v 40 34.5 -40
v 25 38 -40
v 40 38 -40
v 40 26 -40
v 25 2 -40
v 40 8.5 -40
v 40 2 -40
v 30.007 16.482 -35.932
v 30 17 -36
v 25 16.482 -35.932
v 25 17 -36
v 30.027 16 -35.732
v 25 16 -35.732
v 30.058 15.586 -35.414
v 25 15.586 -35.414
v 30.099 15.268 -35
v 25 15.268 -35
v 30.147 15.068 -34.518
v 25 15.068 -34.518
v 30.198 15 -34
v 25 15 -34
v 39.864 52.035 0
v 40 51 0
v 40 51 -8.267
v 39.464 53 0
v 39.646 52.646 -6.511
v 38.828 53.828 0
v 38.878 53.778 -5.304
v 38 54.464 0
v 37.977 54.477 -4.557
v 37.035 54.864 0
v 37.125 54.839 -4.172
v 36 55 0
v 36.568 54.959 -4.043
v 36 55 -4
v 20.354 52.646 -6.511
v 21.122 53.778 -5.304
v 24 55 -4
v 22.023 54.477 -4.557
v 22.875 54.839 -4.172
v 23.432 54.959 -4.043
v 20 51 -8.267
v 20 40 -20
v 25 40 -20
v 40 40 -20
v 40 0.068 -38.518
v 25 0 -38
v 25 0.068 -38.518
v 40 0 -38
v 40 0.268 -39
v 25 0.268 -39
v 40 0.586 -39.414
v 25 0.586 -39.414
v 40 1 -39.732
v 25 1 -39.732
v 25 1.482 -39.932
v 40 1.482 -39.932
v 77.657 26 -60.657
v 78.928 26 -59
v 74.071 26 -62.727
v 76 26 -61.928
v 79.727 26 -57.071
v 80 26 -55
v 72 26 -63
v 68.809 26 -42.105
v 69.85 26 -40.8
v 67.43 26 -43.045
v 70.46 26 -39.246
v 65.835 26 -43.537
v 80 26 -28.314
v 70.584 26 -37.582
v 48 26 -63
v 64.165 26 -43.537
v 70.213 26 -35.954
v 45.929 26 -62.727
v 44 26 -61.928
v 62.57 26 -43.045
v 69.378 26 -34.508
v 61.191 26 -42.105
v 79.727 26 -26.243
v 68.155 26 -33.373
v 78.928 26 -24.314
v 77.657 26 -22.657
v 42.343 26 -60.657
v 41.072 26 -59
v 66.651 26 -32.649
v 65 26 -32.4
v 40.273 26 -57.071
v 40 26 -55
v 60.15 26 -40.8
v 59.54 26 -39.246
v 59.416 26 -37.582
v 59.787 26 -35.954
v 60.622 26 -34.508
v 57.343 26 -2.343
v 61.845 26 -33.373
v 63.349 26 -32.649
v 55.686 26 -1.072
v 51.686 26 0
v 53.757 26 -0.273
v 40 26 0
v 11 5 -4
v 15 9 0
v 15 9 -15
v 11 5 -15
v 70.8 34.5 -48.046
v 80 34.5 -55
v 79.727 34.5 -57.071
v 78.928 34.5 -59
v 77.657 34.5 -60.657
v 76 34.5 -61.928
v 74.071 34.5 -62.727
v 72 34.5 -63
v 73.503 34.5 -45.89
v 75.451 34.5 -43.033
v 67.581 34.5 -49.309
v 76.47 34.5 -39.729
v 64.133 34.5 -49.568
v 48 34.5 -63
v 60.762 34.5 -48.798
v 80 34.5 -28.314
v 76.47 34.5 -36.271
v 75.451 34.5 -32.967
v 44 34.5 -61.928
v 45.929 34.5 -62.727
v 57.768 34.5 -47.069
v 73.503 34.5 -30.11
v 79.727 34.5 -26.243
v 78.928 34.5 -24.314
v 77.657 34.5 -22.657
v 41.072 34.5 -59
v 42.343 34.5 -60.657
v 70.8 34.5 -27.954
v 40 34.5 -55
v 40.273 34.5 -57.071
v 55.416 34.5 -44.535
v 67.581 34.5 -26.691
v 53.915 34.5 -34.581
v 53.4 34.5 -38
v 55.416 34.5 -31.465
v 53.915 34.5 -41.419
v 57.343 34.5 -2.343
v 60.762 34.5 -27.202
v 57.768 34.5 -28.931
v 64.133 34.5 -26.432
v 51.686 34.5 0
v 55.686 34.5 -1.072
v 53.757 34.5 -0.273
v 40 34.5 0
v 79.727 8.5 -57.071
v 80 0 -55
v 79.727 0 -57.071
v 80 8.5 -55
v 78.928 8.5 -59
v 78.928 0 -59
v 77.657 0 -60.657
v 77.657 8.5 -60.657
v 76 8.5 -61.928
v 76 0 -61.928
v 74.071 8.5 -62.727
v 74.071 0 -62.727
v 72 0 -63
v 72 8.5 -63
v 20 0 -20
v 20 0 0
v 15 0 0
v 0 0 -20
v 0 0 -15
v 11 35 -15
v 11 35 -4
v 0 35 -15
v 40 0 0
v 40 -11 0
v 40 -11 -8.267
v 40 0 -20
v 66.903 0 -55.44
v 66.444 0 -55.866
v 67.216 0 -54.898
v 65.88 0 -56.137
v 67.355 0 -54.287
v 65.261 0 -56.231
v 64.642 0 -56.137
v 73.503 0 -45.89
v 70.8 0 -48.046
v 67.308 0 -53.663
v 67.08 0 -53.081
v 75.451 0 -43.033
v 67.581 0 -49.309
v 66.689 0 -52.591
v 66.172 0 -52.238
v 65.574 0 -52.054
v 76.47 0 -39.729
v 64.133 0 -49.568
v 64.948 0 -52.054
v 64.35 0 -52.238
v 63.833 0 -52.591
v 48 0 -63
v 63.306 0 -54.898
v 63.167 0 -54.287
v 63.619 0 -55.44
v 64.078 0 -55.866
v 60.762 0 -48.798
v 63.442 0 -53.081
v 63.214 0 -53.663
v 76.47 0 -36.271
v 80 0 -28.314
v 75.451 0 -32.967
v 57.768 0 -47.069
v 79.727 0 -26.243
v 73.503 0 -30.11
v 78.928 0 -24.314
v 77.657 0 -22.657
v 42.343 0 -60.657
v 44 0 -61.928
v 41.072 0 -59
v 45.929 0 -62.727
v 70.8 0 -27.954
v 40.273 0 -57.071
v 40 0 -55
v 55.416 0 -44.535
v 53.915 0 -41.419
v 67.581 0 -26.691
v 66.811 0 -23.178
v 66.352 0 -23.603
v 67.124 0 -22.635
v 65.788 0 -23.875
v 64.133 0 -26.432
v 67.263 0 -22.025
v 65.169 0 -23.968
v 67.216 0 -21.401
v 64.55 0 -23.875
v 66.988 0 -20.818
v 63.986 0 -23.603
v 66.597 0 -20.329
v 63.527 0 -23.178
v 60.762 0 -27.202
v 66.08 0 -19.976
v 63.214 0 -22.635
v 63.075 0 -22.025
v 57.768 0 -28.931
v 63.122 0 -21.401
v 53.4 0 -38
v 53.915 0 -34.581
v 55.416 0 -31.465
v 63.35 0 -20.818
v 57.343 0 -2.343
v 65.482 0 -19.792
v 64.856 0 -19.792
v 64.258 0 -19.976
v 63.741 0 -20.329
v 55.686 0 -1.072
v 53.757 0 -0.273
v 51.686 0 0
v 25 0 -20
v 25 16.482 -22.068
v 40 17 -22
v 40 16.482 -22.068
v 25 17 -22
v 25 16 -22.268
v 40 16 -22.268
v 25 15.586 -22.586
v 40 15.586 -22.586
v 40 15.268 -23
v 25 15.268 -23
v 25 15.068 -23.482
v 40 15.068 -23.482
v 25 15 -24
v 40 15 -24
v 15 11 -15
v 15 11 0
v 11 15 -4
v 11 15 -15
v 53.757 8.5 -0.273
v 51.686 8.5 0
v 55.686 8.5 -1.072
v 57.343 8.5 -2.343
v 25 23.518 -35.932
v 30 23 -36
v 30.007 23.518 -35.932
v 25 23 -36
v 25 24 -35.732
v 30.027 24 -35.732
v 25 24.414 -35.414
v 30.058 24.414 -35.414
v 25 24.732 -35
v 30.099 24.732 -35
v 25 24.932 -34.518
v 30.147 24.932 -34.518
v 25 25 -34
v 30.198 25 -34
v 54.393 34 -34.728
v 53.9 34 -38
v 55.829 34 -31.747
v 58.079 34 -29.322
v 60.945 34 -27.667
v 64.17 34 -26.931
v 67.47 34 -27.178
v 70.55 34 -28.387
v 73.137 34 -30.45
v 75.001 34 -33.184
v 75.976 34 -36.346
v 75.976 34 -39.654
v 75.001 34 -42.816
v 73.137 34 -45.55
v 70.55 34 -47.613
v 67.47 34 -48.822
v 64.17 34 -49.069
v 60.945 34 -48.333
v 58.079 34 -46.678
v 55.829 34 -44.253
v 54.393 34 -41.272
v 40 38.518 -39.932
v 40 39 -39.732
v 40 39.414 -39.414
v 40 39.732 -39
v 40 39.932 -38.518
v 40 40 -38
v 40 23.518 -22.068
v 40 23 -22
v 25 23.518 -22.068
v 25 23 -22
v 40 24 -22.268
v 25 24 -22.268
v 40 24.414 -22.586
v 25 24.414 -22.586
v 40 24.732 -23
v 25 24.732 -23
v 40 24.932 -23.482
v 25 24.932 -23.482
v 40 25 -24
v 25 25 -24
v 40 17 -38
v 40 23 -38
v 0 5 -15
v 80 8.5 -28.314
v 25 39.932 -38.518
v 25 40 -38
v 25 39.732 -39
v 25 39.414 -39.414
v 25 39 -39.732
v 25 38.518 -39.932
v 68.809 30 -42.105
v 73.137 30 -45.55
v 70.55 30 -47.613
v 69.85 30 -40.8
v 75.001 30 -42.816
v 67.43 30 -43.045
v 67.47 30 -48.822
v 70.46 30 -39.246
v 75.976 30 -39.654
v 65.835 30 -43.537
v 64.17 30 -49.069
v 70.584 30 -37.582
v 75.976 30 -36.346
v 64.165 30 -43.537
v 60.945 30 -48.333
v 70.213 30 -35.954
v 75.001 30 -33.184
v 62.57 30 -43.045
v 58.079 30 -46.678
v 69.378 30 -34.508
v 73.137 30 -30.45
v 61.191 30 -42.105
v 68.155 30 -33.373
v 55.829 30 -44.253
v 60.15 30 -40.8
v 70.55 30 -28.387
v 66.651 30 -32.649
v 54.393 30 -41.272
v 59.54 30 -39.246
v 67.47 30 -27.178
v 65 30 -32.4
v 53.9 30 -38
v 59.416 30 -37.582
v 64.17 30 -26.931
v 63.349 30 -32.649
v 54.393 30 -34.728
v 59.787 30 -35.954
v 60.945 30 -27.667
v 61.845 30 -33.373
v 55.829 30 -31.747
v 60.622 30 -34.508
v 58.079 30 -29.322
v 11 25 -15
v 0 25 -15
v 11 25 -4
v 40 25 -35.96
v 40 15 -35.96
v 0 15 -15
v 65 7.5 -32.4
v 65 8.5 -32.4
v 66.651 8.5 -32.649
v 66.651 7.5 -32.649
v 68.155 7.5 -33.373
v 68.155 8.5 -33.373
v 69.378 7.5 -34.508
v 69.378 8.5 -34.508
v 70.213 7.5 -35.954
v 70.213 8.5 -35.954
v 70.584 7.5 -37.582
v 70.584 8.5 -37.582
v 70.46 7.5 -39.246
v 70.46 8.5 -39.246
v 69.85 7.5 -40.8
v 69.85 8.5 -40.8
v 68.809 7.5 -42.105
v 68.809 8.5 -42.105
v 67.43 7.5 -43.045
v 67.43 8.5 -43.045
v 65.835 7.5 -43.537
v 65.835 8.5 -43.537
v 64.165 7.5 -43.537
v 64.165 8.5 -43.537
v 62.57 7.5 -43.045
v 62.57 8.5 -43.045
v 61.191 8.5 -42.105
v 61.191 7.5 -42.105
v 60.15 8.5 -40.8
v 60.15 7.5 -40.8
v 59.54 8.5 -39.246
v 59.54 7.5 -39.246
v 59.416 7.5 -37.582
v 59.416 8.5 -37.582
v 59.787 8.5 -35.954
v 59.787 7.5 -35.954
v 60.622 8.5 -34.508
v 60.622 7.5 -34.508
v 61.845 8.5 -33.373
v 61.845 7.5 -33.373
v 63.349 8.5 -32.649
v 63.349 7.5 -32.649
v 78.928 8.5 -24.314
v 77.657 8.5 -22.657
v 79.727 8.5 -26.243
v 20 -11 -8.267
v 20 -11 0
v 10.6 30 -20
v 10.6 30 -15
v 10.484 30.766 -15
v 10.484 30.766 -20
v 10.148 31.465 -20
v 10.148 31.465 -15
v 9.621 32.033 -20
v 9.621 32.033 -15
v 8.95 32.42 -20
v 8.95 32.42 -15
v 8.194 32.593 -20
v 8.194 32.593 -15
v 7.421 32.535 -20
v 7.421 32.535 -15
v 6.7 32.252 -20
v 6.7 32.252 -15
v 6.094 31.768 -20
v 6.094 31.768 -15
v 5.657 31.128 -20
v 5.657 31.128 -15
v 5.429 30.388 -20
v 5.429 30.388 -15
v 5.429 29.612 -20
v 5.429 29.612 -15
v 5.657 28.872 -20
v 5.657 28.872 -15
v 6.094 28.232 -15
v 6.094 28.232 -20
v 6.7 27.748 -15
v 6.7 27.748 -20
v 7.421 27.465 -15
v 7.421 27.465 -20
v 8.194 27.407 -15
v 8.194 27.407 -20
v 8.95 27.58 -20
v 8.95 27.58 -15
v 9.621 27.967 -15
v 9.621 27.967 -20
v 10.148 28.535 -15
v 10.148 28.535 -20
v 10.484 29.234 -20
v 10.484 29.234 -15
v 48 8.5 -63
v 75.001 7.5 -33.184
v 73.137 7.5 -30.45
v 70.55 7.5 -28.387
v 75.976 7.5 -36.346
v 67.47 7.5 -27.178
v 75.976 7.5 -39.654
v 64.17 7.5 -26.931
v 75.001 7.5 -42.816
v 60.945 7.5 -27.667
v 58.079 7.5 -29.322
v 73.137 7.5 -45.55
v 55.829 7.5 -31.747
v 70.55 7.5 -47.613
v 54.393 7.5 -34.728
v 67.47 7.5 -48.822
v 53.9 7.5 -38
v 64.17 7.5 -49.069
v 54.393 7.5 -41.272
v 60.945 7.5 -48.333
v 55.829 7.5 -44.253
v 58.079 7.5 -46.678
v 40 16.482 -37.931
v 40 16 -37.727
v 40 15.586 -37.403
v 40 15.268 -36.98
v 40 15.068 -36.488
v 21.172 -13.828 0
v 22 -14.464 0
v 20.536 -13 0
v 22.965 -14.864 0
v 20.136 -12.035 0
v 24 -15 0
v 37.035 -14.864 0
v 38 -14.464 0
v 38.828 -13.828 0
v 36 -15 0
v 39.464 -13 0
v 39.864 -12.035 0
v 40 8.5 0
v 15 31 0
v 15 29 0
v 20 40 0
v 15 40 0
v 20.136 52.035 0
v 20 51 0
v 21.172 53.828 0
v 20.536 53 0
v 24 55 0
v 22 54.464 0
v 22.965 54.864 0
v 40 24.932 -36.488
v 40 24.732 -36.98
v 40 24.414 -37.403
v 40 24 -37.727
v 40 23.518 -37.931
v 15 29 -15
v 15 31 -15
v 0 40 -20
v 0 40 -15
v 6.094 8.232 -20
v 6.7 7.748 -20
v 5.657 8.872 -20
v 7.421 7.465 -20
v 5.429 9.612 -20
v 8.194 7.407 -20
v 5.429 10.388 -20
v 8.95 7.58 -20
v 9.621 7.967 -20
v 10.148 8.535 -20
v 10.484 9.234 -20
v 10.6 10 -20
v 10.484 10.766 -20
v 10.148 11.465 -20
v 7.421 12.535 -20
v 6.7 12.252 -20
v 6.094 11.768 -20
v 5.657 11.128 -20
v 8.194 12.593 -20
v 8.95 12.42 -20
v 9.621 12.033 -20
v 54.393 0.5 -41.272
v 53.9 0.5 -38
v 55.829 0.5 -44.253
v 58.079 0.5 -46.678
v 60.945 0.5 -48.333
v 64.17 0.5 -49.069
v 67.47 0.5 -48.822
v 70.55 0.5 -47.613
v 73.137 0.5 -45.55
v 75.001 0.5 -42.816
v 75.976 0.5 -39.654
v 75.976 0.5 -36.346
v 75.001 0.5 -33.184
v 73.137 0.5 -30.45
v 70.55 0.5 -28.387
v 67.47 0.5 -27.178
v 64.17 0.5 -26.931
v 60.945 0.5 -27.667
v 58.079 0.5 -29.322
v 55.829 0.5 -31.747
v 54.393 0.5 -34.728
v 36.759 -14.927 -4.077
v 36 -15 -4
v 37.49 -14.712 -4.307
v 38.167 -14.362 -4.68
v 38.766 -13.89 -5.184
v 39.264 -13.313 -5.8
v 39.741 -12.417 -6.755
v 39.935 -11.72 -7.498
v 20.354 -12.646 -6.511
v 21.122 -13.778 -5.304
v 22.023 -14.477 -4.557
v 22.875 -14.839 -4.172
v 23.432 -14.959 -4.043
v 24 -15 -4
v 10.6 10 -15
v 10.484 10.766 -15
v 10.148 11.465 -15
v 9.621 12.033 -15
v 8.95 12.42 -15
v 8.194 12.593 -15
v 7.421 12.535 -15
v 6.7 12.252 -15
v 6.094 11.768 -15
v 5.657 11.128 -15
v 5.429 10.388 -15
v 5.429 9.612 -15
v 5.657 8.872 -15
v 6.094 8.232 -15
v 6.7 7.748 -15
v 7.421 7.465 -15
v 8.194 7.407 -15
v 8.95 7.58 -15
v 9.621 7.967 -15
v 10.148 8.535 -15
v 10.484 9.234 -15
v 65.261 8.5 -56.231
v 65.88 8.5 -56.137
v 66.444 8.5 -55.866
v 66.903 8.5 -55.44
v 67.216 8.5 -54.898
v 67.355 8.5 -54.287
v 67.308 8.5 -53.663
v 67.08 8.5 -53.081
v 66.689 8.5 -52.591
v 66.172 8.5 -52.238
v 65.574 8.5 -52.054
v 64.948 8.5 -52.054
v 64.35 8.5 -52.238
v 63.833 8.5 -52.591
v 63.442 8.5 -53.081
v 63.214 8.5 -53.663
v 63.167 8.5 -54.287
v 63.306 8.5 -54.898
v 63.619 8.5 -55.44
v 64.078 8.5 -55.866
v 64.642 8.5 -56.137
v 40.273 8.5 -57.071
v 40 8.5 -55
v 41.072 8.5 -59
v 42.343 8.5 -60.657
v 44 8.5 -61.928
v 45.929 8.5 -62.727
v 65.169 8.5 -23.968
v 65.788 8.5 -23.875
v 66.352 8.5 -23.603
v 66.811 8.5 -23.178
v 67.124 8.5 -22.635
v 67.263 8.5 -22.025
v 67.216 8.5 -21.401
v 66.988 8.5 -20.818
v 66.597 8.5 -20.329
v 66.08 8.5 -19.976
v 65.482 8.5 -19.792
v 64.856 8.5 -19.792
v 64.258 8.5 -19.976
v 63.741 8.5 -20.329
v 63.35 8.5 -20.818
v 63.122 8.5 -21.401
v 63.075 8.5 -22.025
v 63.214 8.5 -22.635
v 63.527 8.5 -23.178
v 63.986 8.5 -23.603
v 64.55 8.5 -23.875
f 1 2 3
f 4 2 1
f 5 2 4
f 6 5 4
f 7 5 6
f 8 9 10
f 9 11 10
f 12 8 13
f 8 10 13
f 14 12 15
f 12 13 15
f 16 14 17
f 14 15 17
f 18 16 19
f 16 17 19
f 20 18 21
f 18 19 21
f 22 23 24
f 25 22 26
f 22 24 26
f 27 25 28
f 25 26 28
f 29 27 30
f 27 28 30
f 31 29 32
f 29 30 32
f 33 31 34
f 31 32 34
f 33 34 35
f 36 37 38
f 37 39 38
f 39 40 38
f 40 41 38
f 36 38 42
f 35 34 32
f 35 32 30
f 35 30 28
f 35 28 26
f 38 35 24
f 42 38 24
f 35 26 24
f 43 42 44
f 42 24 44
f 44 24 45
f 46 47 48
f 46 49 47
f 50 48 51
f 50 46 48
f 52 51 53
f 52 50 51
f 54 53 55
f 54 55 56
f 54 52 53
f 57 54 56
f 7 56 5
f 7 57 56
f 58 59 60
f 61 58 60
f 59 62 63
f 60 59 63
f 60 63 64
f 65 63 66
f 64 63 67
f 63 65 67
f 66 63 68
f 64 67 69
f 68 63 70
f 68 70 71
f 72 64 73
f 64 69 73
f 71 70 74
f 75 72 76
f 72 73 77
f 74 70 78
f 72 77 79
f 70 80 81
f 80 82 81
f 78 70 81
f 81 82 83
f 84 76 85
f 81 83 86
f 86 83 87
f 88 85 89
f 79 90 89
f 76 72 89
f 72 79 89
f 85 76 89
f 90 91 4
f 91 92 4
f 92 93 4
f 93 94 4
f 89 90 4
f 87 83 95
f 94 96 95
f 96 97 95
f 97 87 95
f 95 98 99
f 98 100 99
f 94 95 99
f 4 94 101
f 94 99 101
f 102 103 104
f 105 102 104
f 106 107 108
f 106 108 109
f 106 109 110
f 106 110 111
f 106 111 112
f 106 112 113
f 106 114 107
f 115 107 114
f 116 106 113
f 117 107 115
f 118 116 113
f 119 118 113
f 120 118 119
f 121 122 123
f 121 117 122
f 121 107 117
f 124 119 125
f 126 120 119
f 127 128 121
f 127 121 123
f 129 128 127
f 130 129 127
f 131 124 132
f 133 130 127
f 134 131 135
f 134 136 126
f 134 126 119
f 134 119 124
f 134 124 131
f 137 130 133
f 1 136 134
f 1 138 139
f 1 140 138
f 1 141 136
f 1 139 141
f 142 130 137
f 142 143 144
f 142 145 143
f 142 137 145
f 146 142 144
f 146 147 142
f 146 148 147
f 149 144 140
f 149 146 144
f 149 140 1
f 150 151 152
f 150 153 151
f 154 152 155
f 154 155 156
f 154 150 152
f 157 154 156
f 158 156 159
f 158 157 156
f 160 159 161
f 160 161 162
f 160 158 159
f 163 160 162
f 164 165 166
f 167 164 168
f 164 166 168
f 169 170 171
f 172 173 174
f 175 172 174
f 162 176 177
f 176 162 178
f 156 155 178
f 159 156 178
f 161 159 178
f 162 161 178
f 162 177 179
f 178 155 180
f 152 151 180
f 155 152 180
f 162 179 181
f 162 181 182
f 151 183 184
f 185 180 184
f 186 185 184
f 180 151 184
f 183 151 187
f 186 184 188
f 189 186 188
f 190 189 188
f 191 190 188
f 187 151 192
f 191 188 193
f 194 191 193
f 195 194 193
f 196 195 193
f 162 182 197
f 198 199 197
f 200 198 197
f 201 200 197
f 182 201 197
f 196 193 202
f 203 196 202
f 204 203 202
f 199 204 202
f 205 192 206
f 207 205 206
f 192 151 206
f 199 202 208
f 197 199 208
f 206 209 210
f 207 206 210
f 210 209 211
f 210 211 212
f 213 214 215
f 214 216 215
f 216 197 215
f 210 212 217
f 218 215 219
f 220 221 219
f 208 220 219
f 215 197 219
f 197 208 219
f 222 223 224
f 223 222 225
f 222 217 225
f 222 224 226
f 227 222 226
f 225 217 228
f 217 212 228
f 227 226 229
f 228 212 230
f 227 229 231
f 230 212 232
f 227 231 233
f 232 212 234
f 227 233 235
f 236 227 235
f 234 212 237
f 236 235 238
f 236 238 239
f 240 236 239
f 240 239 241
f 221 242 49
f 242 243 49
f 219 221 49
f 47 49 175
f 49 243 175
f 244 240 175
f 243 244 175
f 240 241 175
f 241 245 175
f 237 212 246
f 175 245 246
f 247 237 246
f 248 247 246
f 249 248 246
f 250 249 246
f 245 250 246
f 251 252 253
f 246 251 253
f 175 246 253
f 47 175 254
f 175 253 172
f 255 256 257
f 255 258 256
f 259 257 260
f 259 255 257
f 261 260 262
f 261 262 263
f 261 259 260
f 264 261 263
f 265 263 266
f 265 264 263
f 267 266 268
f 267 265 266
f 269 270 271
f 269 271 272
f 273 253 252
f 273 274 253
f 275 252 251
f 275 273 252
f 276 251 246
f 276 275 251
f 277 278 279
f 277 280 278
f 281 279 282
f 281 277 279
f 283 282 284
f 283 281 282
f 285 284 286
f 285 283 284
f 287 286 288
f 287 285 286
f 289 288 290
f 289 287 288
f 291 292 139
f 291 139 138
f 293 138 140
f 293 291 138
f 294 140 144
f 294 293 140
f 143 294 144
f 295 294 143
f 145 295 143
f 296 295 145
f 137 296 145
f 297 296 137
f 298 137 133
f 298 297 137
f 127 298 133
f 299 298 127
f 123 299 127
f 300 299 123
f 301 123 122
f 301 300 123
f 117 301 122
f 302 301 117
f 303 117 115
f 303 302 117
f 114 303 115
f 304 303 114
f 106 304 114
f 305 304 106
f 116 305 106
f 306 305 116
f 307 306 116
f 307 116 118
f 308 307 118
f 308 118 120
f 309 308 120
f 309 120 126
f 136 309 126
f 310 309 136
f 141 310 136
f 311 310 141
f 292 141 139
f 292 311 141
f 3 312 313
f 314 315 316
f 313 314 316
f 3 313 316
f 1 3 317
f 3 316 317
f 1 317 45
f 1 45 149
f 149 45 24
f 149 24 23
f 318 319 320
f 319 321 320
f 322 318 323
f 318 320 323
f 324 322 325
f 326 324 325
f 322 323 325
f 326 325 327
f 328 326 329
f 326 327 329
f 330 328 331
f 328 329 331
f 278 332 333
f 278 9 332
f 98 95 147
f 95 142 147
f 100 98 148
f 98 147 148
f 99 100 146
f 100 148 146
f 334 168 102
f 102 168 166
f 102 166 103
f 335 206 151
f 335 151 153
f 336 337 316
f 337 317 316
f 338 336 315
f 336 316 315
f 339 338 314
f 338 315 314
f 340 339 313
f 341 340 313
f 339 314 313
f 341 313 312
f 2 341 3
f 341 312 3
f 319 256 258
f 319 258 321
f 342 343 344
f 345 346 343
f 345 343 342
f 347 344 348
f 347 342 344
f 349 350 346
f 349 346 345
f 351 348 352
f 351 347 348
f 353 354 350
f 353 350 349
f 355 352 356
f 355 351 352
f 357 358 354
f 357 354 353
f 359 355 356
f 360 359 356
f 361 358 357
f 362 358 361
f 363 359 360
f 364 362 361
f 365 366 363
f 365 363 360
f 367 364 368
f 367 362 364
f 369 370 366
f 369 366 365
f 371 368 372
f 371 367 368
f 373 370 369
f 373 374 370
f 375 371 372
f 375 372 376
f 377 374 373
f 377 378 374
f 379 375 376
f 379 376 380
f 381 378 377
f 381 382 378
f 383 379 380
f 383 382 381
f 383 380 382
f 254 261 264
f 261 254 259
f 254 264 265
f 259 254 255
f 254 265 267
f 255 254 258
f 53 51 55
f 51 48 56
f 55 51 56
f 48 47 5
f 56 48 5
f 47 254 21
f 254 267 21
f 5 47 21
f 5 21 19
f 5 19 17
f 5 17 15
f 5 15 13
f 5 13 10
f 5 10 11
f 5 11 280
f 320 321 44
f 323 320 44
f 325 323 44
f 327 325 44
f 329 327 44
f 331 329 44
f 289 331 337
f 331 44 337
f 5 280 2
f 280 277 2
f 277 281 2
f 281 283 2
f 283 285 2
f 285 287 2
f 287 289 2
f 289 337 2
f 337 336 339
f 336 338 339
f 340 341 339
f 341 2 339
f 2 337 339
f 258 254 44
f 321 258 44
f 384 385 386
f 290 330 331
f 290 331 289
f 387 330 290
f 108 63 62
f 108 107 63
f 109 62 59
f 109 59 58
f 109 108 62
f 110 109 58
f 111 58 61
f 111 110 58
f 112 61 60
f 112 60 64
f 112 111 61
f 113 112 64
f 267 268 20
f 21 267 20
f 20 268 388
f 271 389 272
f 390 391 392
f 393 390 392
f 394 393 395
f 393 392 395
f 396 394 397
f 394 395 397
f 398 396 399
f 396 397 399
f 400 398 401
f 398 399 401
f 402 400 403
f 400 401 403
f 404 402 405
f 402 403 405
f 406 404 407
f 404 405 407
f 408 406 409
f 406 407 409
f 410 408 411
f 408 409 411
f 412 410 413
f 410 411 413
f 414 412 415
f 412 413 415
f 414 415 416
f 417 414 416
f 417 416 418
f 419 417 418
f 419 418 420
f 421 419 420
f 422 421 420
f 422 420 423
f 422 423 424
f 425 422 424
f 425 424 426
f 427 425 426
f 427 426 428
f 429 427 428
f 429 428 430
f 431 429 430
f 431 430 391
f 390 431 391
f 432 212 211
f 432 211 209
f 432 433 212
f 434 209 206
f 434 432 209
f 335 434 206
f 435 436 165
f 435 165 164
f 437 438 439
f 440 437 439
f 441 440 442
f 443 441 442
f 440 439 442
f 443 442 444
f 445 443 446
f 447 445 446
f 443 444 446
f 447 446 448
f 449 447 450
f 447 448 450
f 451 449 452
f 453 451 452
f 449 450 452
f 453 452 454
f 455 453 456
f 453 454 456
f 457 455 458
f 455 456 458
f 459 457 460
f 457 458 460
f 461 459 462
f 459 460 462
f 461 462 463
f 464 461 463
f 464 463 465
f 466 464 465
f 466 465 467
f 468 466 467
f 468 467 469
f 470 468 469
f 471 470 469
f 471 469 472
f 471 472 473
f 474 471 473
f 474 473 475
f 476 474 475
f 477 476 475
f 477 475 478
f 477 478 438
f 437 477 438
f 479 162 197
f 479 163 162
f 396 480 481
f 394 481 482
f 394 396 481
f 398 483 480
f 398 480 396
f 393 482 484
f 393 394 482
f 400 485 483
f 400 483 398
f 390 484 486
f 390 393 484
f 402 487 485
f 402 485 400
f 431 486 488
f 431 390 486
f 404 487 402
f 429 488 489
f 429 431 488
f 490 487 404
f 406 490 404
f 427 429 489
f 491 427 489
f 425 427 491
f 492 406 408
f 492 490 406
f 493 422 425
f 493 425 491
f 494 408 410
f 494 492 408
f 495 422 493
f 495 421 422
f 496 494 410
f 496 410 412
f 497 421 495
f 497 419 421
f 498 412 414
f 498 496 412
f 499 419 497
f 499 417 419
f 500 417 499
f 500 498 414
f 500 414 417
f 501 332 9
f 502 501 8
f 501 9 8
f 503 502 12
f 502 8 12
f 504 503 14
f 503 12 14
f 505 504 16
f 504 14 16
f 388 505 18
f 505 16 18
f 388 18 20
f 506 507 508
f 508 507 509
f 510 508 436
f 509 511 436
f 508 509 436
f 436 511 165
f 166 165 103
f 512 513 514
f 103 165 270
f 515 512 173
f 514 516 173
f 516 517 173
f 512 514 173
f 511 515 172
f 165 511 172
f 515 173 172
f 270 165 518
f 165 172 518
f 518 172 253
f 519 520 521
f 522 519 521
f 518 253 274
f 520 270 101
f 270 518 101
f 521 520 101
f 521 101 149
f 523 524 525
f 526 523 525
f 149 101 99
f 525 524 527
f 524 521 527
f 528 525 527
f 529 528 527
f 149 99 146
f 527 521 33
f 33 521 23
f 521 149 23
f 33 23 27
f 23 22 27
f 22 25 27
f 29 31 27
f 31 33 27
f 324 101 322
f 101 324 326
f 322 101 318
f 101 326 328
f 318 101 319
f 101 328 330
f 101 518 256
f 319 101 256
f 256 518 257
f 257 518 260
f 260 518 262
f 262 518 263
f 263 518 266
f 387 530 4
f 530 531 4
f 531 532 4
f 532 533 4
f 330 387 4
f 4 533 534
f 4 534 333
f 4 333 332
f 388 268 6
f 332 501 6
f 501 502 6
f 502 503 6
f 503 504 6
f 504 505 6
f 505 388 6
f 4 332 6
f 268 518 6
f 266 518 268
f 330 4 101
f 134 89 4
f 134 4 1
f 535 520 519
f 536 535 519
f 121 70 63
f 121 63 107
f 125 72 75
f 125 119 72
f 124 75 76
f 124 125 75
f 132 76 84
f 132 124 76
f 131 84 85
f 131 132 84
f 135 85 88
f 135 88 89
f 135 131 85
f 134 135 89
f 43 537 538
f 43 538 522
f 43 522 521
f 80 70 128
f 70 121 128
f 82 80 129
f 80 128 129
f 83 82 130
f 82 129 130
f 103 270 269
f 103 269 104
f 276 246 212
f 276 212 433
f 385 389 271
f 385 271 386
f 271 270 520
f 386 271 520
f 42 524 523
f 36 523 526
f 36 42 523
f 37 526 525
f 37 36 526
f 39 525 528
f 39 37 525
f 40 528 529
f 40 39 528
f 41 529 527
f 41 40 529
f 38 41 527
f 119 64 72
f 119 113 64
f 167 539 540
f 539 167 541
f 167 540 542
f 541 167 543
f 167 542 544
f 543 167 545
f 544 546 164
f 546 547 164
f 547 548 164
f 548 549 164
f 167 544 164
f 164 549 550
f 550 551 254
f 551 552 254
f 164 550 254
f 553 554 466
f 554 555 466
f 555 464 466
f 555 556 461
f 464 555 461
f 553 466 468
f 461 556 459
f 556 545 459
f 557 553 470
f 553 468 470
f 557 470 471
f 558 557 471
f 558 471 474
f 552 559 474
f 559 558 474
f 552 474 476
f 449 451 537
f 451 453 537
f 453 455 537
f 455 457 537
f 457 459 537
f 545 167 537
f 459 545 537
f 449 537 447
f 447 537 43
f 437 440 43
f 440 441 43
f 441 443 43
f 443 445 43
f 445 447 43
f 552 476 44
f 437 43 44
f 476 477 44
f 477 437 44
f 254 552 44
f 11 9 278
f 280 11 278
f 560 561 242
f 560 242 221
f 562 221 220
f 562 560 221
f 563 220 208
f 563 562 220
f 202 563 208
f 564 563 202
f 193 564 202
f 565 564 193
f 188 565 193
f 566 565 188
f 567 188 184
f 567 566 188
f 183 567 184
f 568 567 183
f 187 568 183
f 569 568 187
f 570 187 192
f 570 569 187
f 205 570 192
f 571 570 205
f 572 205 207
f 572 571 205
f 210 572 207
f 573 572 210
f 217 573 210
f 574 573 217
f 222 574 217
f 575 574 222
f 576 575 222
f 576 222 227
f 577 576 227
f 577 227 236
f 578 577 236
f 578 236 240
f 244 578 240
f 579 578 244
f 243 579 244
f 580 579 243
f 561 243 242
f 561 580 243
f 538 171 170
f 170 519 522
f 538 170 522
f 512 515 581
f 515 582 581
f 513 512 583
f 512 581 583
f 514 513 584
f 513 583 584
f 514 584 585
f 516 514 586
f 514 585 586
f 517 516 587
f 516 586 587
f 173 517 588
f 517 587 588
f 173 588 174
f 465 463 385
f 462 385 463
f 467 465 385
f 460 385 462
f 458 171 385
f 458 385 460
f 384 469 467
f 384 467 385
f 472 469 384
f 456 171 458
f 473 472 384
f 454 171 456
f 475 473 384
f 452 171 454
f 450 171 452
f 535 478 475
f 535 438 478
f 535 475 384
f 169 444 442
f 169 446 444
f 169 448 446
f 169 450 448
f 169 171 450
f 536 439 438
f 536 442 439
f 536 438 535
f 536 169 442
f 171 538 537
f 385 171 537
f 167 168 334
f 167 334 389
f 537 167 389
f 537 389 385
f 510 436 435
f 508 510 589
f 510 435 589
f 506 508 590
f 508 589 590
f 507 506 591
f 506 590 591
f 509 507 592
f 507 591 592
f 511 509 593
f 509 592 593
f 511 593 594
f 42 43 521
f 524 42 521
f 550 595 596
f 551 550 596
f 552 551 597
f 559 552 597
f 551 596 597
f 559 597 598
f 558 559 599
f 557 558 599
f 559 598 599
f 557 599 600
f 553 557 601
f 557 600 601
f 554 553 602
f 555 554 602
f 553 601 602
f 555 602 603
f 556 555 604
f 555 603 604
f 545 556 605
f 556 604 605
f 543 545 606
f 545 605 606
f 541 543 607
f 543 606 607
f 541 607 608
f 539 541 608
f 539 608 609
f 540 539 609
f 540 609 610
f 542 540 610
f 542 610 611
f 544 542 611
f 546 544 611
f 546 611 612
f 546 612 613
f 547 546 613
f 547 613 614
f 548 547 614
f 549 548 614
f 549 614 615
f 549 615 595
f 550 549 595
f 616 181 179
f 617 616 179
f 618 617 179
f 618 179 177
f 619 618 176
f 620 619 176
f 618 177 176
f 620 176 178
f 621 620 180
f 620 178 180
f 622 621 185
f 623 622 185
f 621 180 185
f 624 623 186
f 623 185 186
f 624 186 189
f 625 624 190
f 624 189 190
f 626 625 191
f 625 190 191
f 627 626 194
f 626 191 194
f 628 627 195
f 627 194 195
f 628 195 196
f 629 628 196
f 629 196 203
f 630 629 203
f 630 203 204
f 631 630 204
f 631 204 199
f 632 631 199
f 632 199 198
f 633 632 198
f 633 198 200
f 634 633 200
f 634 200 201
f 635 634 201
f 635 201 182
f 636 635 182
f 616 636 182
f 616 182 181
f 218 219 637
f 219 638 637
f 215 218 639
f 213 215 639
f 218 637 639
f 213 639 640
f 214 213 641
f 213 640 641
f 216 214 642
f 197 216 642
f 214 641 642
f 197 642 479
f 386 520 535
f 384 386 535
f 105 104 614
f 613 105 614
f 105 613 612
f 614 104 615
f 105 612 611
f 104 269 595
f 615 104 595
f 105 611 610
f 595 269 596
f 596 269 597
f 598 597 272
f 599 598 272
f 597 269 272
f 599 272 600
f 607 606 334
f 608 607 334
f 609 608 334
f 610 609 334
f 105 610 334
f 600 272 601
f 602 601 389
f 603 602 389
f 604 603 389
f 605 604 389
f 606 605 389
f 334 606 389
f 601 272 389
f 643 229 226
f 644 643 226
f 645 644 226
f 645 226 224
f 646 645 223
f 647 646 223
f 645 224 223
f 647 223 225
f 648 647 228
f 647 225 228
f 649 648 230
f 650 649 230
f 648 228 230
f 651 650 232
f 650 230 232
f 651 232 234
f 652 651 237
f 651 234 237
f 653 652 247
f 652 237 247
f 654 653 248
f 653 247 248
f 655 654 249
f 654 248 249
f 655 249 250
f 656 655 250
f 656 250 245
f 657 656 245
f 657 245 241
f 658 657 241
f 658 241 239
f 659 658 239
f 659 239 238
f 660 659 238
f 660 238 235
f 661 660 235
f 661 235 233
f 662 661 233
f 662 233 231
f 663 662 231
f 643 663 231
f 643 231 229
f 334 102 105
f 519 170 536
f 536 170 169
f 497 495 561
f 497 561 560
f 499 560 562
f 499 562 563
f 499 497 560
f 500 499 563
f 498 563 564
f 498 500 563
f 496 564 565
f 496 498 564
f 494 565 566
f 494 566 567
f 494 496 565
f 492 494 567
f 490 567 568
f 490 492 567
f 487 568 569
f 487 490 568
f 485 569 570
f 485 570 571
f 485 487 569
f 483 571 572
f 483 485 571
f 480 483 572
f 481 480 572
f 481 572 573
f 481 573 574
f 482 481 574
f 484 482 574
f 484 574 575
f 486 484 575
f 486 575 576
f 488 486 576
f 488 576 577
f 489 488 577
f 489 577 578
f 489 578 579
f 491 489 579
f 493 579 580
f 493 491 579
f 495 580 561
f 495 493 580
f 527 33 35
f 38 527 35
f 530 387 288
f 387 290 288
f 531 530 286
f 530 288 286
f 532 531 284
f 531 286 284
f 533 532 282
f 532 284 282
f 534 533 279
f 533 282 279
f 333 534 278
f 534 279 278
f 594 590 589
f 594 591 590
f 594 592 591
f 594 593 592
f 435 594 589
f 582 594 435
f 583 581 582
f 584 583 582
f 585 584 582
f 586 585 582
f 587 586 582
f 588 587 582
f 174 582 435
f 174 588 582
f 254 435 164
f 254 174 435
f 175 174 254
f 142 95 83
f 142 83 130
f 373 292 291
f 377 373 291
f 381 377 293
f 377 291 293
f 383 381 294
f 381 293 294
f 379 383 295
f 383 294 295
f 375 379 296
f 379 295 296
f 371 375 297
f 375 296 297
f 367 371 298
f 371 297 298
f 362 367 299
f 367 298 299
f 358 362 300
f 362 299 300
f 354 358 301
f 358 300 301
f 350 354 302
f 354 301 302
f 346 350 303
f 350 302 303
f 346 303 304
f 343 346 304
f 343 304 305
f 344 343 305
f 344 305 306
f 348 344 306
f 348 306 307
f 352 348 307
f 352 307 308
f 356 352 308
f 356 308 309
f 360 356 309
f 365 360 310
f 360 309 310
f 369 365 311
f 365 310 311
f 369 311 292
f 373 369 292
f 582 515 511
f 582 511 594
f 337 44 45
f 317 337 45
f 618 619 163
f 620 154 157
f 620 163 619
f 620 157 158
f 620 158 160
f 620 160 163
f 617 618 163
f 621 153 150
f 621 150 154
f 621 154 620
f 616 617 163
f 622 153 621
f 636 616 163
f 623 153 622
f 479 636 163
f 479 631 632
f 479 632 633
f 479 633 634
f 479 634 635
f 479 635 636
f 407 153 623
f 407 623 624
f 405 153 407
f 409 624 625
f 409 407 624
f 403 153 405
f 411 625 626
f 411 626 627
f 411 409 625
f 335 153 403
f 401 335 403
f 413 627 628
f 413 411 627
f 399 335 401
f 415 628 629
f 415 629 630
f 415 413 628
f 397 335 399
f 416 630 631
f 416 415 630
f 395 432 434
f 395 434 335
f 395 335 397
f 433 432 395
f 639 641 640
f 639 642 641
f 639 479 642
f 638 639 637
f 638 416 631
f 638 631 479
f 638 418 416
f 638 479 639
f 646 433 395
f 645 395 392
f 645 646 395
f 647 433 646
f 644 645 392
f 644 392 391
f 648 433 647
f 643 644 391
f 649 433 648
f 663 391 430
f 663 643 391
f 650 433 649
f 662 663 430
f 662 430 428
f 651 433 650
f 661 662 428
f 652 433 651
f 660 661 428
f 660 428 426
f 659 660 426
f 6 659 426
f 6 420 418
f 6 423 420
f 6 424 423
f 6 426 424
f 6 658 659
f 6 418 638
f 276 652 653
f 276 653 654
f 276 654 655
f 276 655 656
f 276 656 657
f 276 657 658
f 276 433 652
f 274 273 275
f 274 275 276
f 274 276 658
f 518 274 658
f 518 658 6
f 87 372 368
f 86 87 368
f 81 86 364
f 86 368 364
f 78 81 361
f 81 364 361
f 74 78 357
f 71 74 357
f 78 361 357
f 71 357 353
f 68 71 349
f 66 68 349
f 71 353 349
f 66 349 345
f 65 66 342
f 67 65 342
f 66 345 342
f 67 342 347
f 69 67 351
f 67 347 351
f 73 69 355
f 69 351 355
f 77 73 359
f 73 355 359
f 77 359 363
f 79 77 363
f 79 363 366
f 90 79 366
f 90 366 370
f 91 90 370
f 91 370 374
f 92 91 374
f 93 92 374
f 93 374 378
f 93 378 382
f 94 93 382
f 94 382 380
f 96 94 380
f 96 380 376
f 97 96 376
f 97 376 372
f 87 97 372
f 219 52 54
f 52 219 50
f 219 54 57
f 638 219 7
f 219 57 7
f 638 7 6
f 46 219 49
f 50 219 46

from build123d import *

# Parameters (mm, degrees)
SKETCH1_W                = 40
SKETCH1_H                = 40
BOSS_EXTRUDE1_DEPTH      = 40
SKETCH2_W                = 25
SKETCH2_H                = 20
CUT_EXTRUDE1_DEPTH       = 40
CHAMFER1_SIZE            = 15
CUT_EXTRUDE2_DEPTH       = 15
CHAMFER2_SIZE            = 4
SKETCH4_R                = 2.6
CUT_EXTRUDE3_DEPTH       = 17
BOSS_EXTRUDE2_DEPTH      = 8
BOSS_EXTRUDE2_DEPTH_BACK = 40
SKETCH5_W                = 40
SKETCH5_H                = 8.5
SKETCH10_W               = 14
SKETCH10_H               = 10
CUT_EXTRUDE5_DEPTH       = 26
SKETCH8_R                = 5.6
CUT_EXTRUDE4_DEPTH       = 34
BOSS_EXTRUDE3_DEPTH      = 20
FILLET3_R                = 4
FILLET4_R                = 2
CHAMFER7_SIZE            = 25
CHAMFER8_SIZE            = 2
CHAMFER8_SIZE2           = 10
FILLET7_R                = 2
SKETCH14_W               = 40
SKETCH14_H               = 8.5
BOSS_EXTRUDE4_DEPTH      = 15
SKETCH16_W               = 40
SKETCH16_H               = 8.5
BOSS_EXTRUDE5_DEPTH      = 15
SKETCH12_R               = 11.1
CUT_EXTRUDE6_DEPTH       = 4.5
CUT_EXTRUDE7_START       = -7.5
SKETCH13_R               = 11.1
CUT_EXTRUDE7_DEPTH       = 7.5
SKETCH15_R               = 2.1
CUT_EXTRUDE8_DEPTH       = 10
CHAMFER10_SIZE           = 0.5
FILLET8_R                = 8


with BuildPart() as part:
    # Sketch1 → Boss-Extrude1 (new body)
    with BuildSketch(Plane(origin=(0, 0, 0), x_dir=(1, 0, 0), z_dir=(0, 1, 0))):
        with Locations((20, 20)):
            Rectangle(SKETCH1_W, SKETCH1_H)
    extrude(amount=BOSS_EXTRUDE1_DEPTH)

    # Sketch2 → Cut-Extrude1 (cut)
    with BuildSketch(Plane(origin=(0, 40, 0), x_dir=(1, 0, 0), z_dir=(0, 1, 0))):
        with Locations((12.5, 30)):
            Rectangle(SKETCH2_W, SKETCH2_H)
    extrude(amount=-CUT_EXTRUDE1_DEPTH, mode=Mode.SUBTRACT)

    # Chamfer1
    chamfer1_edges = [part.edges().sort_by_distance(p)[0] for p in [
        (0, 20, 0),
    ]]
    chamfer(chamfer1_edges, length=CHAMFER1_SIZE)

    # Sketch3 → Cut-Extrude2 (cut)
    with BuildSketch(Plane.XY):
        Polygon((0, 10), (0, 15), (15, 15), (15, 5), (0, 5), align=None)
        Polygon((0, 30), (0, 25), (15, 25), (15, 35), (0, 35), align=None)
    extrude(amount=-CUT_EXTRUDE2_DEPTH, mode=Mode.SUBTRACT)

    # Chamfer2
    chamfer2_edges = [part.edges().sort_by_distance(p)[0] for p in [
        (15, 35, -7.5),
        (15, 25, -7.5),
        (15, 15, -7.5),
        (15, 5, -7.5),
    ]]
    chamfer(chamfer2_edges, length=CHAMFER2_SIZE)

    # Sketch4 → Cut-Extrude3 (cut)
    with BuildSketch(Plane.XY.offset(-15)):
        with Locations((8, 30)):
            Circle(SKETCH4_R)
        with Locations((8, 10)):
            Circle(SKETCH4_R)
    extrude(amount=-CUT_EXTRUDE3_DEPTH, mode=Mode.SUBTRACT)

    # Sketch5 → Boss-Extrude2 (add, two sides: drawn at the far end of the back side and taken through both)
    with BuildSketch(Plane(origin=(0, 0, -40), x_dir=(-1, 0, 0), z_dir=(0, 0, -1)).offset(-BOSS_EXTRUDE2_DEPTH_BACK)):
        with Locations((-60, 4.25)):
            Rectangle(SKETCH5_W, SKETCH5_H)
        with Locations((-60, 30.25)):
            Rectangle(SKETCH5_W, SKETCH5_H)
    extrude(amount=BOSS_EXTRUDE2_DEPTH + BOSS_EXTRUDE2_DEPTH_BACK)

    # Sketch10 → Cut-Extrude5 (cut)
    with BuildSketch(Plane(origin=(40, 0, 0), x_dir=(0, 0, -1), z_dir=(1, 0, 0))):
        with Locations((29, 20)):
            Rectangle(SKETCH10_W, SKETCH10_H)
    extrude(amount=-CUT_EXTRUDE5_DEPTH, mode=Mode.SUBTRACT)

    # Sketch8 → Cut-Extrude4 (cut)
    with BuildSketch(Plane(origin=(0, 32, 0), x_dir=(1, 0, 0), z_dir=(0, 1, 0))):
        with Locations(Location((65, 38, 0), (0, 0, 270))):
            Circle(SKETCH8_R)
    extrude(amount=-CUT_EXTRUDE4_DEPTH, mode=Mode.SUBTRACT)

    # Sketch9 → Boss-Extrude3 (add)
    with BuildSketch(Plane(origin=(40, 0, 0), x_dir=(0, 0, -1), z_dir=(1, 0, 0))):
        Polygon((0, 40), (0, 55), (4, 55), (20, 40), align=None)
        Polygon((0, 0), (0, -15), (4, -15), (20, 0), align=None)
    extrude(amount=-BOSS_EXTRUDE3_DEPTH)

    # Fillet3
    fillet3_edges = [part.edges().sort_by_distance(p)[0] for p in [
        (20, 55, -2),
        (40, 55, -2),
        (20, -15, -2),
        (40, -15, -2),
    ]]
    fillet(fillet3_edges, radius=FILLET3_R)

    # Fillet4
    fillet4_edges = [part.edges().sort_by_distance(p)[0] for p in [
        (32.5, 40, -40),
        (32.5, 0, -40),
    ]]
    fillet(fillet4_edges, radius=FILLET4_R)

    # Chamfer7
    chamfer7_edges = [part.edges().sort_by_distance(p)[0] for p in [
        (80, 4.25, 0),
        (80, 30.25, 0),
    ]]
    chamfer(chamfer7_edges, length=CHAMFER7_SIZE)

    # Chamfer8
    chamfer8_edges = [part.edges().sort_by_distance(p)[0] for p in [
        (40, 20, -36),
    ]]
    chamfer8_side = [part.faces().sort_by_distance(p)[0] for p in [
        (40, 16.5625, -17.75),
    ]]
    chamfer(chamfer8_edges, length=CHAMFER8_SIZE, length2=CHAMFER8_SIZE2, reference=chamfer8_side[0])

    # Fillet7
    fillet7_edges = [part.edges().sort_by_distance(p)[0] for p in [
        (27.5, 15, -36),
        (32.5, 15, -22),
        (32.5, 25, -22),
        (27.5, 25, -36),
        (35, 25, -37),
        (35, 15, -37),
    ]]
    fillet(fillet7_edges, radius=FILLET7_R)

    # Sketch14 → Boss-Extrude4 (add)
    with BuildSketch(Plane(origin=(0, 0, -48), x_dir=(-1, 0, 0), z_dir=(0, 0, -1))):
        with Locations((-60, 4.25)):
            Rectangle(SKETCH14_W, SKETCH14_H)
    extrude(amount=BOSS_EXTRUDE4_DEPTH)

    # Sketch16 → Boss-Extrude5 (add)
    with BuildSketch(Plane(origin=(0, 0, -48), x_dir=(-1, 0, 0), z_dir=(0, 0, -1))):
        with Locations((-60, 30.25)):
            Rectangle(SKETCH16_W, SKETCH16_H)
    extrude(amount=BOSS_EXTRUDE5_DEPTH)

    # Sketch12 → Cut-Extrude6 (cut)
    with BuildSketch(Plane(origin=(0, 34.5, 0), x_dir=(1, 0, 0), z_dir=(0, 1, 0))):
        with Locations(Location((65, 38, 0), (0, 0, 180))):
            Circle(SKETCH12_R)
    extrude(amount=-CUT_EXTRUDE6_DEPTH, mode=Mode.SUBTRACT)

    # Sketch13 → Cut-Extrude7 (cut)
    with BuildSketch(Plane.XZ.offset(CUT_EXTRUDE7_START)):
        with Locations(Location((65, -38, 0), (0, 0, 180))):
            Circle(SKETCH13_R)
    extrude(amount=CUT_EXTRUDE7_DEPTH, mode=Mode.SUBTRACT)

    # Sketch15 → Cut-Extrude8 (cut)
    with BuildSketch(Plane.XZ):
        with Locations(Location((65.260929409, -54.130501699, 0), (0, 0, 270))):
            Circle(SKETCH15_R)
        with Locations(Location((65.16900186, -21.868239994, 0), (0, 0, 270))):
            Circle(SKETCH15_R)
    extrude(amount=-CUT_EXTRUDE8_DEPTH, mode=Mode.SUBTRACT)

    # Chamfer10
    chamfer10_edges = [part.edges().sort_by_distance(p)[0] for p in [
        (76.1, 34.5, -38),
        (76.1, 0, -38),
    ]]
    chamfer(chamfer10_edges, length=CHAMFER10_SIZE)

    # Fillet8
    fillet8_edges = [part.edges().sort_by_distance(p)[0] for p in [
        (55, 30.25, 0),
        (55, 4.25, 0),
        (80, 4.25, -25),
        (80, 30.25, -25),
        (80, 4.25, -63),
        (40, 4.25, -63),
        (80, 30.25, -63),
        (40, 30.25, -63),
    ]]
    fillet(fillet8_edges, radius=FILLET8_R)


solid = part.part
